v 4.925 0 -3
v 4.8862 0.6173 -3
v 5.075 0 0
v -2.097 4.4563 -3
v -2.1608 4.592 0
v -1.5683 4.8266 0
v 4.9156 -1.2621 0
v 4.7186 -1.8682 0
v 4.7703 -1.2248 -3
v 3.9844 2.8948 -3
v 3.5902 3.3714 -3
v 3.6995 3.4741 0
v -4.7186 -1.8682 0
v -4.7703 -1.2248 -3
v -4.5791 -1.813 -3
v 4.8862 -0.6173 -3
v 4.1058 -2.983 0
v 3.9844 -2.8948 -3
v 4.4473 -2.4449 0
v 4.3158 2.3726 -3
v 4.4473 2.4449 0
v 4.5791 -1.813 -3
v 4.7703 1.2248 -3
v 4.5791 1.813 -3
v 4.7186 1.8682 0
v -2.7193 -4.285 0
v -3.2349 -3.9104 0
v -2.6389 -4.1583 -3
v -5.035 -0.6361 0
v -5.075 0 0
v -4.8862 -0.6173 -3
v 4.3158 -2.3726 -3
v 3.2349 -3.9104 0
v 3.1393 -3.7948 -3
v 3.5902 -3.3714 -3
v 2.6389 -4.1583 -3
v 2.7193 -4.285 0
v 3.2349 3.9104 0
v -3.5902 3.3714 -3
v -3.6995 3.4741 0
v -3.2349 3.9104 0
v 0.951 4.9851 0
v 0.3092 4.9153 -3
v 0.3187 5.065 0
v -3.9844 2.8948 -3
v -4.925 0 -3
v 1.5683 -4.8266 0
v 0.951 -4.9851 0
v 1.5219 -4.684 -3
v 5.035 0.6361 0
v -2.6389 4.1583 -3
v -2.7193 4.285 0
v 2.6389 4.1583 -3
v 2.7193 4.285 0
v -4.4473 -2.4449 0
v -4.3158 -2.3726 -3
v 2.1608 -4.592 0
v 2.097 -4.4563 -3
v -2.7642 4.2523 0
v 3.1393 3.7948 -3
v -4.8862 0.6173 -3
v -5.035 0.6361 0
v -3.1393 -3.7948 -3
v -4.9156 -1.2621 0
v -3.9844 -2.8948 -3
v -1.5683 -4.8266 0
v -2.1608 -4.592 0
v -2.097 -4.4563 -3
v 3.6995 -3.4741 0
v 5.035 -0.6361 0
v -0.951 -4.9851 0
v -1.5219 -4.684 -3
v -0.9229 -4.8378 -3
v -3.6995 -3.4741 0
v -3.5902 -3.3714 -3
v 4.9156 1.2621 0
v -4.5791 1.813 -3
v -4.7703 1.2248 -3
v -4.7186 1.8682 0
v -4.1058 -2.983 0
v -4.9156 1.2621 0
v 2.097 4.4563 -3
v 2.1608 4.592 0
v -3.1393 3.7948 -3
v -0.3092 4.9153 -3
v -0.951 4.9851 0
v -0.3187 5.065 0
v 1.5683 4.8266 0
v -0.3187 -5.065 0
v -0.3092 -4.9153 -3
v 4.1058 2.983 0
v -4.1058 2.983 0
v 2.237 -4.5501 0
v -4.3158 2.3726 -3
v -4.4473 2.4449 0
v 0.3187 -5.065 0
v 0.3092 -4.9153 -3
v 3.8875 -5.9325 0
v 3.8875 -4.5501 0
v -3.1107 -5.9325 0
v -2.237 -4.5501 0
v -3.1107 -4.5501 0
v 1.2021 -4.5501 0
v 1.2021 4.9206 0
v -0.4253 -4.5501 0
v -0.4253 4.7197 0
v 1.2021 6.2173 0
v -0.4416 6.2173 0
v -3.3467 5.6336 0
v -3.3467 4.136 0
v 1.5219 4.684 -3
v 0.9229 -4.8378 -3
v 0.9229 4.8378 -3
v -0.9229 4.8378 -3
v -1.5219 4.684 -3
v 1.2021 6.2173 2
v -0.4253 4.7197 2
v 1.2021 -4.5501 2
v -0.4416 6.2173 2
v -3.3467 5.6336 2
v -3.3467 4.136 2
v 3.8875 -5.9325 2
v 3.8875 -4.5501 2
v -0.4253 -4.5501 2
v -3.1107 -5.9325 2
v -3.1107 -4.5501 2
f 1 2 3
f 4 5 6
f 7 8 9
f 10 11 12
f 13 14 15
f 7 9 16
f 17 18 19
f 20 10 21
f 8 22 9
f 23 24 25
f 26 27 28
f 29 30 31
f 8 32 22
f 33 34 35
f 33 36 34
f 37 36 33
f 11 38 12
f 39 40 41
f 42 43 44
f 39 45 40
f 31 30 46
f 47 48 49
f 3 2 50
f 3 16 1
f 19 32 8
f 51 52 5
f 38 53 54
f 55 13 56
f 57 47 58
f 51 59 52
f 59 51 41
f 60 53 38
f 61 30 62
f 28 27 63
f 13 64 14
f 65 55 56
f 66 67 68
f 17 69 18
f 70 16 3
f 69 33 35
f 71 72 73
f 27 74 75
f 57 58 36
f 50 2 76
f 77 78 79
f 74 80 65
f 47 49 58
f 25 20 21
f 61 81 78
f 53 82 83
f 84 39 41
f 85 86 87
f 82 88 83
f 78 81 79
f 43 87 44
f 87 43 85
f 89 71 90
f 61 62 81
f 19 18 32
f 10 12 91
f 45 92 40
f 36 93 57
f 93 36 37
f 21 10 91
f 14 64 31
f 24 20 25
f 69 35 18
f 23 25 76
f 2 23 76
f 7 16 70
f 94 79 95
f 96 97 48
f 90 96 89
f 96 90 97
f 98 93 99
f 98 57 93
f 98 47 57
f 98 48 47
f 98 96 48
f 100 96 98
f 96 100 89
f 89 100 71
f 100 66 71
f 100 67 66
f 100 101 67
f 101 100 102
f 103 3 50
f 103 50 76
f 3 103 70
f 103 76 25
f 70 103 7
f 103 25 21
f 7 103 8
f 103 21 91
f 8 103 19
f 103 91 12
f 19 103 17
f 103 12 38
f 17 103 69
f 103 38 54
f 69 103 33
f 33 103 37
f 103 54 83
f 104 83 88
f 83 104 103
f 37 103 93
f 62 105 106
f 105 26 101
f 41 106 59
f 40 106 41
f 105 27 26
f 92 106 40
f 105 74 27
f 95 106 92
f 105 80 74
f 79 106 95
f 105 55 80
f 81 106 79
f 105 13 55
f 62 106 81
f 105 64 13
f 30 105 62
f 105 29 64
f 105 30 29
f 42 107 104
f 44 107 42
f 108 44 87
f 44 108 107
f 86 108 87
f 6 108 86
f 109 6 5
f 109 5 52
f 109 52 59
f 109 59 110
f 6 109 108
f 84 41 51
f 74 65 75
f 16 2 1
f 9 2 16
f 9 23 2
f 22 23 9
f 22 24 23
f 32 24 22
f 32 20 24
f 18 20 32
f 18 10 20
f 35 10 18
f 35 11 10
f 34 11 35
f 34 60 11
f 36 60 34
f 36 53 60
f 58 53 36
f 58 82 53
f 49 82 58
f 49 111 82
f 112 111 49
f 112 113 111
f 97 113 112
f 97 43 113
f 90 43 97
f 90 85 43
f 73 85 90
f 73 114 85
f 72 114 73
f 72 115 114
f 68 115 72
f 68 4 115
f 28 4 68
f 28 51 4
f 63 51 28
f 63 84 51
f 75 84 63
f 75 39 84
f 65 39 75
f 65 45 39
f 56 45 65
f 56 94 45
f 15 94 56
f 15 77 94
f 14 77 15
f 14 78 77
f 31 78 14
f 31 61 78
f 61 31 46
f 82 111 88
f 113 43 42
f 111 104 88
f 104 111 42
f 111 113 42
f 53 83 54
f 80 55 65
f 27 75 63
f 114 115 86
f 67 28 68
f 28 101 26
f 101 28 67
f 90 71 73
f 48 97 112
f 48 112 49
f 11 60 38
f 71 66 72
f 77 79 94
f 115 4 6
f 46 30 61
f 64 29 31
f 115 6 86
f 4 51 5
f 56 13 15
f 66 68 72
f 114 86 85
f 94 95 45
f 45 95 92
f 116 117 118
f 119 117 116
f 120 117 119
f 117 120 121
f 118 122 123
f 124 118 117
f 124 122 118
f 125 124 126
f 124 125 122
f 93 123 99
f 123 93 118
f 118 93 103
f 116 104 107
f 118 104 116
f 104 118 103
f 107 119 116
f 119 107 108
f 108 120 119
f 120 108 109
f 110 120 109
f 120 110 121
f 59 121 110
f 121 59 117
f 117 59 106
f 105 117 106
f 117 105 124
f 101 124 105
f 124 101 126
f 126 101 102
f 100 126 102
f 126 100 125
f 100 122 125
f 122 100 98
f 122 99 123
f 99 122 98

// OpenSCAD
$fn = 50;


difference() {
	union() {
		translate(v = [0, 0, -3.0000000000]) {
			cylinder(h = 3, r1 = 4.9250000000, r2 = 5.0750000000);
		}
		linear_extrude(height = 2) {
			text(font = "Impact", halign = "center", size = 12, text = "1", valign = "center");
		}
	}
	union();
}
